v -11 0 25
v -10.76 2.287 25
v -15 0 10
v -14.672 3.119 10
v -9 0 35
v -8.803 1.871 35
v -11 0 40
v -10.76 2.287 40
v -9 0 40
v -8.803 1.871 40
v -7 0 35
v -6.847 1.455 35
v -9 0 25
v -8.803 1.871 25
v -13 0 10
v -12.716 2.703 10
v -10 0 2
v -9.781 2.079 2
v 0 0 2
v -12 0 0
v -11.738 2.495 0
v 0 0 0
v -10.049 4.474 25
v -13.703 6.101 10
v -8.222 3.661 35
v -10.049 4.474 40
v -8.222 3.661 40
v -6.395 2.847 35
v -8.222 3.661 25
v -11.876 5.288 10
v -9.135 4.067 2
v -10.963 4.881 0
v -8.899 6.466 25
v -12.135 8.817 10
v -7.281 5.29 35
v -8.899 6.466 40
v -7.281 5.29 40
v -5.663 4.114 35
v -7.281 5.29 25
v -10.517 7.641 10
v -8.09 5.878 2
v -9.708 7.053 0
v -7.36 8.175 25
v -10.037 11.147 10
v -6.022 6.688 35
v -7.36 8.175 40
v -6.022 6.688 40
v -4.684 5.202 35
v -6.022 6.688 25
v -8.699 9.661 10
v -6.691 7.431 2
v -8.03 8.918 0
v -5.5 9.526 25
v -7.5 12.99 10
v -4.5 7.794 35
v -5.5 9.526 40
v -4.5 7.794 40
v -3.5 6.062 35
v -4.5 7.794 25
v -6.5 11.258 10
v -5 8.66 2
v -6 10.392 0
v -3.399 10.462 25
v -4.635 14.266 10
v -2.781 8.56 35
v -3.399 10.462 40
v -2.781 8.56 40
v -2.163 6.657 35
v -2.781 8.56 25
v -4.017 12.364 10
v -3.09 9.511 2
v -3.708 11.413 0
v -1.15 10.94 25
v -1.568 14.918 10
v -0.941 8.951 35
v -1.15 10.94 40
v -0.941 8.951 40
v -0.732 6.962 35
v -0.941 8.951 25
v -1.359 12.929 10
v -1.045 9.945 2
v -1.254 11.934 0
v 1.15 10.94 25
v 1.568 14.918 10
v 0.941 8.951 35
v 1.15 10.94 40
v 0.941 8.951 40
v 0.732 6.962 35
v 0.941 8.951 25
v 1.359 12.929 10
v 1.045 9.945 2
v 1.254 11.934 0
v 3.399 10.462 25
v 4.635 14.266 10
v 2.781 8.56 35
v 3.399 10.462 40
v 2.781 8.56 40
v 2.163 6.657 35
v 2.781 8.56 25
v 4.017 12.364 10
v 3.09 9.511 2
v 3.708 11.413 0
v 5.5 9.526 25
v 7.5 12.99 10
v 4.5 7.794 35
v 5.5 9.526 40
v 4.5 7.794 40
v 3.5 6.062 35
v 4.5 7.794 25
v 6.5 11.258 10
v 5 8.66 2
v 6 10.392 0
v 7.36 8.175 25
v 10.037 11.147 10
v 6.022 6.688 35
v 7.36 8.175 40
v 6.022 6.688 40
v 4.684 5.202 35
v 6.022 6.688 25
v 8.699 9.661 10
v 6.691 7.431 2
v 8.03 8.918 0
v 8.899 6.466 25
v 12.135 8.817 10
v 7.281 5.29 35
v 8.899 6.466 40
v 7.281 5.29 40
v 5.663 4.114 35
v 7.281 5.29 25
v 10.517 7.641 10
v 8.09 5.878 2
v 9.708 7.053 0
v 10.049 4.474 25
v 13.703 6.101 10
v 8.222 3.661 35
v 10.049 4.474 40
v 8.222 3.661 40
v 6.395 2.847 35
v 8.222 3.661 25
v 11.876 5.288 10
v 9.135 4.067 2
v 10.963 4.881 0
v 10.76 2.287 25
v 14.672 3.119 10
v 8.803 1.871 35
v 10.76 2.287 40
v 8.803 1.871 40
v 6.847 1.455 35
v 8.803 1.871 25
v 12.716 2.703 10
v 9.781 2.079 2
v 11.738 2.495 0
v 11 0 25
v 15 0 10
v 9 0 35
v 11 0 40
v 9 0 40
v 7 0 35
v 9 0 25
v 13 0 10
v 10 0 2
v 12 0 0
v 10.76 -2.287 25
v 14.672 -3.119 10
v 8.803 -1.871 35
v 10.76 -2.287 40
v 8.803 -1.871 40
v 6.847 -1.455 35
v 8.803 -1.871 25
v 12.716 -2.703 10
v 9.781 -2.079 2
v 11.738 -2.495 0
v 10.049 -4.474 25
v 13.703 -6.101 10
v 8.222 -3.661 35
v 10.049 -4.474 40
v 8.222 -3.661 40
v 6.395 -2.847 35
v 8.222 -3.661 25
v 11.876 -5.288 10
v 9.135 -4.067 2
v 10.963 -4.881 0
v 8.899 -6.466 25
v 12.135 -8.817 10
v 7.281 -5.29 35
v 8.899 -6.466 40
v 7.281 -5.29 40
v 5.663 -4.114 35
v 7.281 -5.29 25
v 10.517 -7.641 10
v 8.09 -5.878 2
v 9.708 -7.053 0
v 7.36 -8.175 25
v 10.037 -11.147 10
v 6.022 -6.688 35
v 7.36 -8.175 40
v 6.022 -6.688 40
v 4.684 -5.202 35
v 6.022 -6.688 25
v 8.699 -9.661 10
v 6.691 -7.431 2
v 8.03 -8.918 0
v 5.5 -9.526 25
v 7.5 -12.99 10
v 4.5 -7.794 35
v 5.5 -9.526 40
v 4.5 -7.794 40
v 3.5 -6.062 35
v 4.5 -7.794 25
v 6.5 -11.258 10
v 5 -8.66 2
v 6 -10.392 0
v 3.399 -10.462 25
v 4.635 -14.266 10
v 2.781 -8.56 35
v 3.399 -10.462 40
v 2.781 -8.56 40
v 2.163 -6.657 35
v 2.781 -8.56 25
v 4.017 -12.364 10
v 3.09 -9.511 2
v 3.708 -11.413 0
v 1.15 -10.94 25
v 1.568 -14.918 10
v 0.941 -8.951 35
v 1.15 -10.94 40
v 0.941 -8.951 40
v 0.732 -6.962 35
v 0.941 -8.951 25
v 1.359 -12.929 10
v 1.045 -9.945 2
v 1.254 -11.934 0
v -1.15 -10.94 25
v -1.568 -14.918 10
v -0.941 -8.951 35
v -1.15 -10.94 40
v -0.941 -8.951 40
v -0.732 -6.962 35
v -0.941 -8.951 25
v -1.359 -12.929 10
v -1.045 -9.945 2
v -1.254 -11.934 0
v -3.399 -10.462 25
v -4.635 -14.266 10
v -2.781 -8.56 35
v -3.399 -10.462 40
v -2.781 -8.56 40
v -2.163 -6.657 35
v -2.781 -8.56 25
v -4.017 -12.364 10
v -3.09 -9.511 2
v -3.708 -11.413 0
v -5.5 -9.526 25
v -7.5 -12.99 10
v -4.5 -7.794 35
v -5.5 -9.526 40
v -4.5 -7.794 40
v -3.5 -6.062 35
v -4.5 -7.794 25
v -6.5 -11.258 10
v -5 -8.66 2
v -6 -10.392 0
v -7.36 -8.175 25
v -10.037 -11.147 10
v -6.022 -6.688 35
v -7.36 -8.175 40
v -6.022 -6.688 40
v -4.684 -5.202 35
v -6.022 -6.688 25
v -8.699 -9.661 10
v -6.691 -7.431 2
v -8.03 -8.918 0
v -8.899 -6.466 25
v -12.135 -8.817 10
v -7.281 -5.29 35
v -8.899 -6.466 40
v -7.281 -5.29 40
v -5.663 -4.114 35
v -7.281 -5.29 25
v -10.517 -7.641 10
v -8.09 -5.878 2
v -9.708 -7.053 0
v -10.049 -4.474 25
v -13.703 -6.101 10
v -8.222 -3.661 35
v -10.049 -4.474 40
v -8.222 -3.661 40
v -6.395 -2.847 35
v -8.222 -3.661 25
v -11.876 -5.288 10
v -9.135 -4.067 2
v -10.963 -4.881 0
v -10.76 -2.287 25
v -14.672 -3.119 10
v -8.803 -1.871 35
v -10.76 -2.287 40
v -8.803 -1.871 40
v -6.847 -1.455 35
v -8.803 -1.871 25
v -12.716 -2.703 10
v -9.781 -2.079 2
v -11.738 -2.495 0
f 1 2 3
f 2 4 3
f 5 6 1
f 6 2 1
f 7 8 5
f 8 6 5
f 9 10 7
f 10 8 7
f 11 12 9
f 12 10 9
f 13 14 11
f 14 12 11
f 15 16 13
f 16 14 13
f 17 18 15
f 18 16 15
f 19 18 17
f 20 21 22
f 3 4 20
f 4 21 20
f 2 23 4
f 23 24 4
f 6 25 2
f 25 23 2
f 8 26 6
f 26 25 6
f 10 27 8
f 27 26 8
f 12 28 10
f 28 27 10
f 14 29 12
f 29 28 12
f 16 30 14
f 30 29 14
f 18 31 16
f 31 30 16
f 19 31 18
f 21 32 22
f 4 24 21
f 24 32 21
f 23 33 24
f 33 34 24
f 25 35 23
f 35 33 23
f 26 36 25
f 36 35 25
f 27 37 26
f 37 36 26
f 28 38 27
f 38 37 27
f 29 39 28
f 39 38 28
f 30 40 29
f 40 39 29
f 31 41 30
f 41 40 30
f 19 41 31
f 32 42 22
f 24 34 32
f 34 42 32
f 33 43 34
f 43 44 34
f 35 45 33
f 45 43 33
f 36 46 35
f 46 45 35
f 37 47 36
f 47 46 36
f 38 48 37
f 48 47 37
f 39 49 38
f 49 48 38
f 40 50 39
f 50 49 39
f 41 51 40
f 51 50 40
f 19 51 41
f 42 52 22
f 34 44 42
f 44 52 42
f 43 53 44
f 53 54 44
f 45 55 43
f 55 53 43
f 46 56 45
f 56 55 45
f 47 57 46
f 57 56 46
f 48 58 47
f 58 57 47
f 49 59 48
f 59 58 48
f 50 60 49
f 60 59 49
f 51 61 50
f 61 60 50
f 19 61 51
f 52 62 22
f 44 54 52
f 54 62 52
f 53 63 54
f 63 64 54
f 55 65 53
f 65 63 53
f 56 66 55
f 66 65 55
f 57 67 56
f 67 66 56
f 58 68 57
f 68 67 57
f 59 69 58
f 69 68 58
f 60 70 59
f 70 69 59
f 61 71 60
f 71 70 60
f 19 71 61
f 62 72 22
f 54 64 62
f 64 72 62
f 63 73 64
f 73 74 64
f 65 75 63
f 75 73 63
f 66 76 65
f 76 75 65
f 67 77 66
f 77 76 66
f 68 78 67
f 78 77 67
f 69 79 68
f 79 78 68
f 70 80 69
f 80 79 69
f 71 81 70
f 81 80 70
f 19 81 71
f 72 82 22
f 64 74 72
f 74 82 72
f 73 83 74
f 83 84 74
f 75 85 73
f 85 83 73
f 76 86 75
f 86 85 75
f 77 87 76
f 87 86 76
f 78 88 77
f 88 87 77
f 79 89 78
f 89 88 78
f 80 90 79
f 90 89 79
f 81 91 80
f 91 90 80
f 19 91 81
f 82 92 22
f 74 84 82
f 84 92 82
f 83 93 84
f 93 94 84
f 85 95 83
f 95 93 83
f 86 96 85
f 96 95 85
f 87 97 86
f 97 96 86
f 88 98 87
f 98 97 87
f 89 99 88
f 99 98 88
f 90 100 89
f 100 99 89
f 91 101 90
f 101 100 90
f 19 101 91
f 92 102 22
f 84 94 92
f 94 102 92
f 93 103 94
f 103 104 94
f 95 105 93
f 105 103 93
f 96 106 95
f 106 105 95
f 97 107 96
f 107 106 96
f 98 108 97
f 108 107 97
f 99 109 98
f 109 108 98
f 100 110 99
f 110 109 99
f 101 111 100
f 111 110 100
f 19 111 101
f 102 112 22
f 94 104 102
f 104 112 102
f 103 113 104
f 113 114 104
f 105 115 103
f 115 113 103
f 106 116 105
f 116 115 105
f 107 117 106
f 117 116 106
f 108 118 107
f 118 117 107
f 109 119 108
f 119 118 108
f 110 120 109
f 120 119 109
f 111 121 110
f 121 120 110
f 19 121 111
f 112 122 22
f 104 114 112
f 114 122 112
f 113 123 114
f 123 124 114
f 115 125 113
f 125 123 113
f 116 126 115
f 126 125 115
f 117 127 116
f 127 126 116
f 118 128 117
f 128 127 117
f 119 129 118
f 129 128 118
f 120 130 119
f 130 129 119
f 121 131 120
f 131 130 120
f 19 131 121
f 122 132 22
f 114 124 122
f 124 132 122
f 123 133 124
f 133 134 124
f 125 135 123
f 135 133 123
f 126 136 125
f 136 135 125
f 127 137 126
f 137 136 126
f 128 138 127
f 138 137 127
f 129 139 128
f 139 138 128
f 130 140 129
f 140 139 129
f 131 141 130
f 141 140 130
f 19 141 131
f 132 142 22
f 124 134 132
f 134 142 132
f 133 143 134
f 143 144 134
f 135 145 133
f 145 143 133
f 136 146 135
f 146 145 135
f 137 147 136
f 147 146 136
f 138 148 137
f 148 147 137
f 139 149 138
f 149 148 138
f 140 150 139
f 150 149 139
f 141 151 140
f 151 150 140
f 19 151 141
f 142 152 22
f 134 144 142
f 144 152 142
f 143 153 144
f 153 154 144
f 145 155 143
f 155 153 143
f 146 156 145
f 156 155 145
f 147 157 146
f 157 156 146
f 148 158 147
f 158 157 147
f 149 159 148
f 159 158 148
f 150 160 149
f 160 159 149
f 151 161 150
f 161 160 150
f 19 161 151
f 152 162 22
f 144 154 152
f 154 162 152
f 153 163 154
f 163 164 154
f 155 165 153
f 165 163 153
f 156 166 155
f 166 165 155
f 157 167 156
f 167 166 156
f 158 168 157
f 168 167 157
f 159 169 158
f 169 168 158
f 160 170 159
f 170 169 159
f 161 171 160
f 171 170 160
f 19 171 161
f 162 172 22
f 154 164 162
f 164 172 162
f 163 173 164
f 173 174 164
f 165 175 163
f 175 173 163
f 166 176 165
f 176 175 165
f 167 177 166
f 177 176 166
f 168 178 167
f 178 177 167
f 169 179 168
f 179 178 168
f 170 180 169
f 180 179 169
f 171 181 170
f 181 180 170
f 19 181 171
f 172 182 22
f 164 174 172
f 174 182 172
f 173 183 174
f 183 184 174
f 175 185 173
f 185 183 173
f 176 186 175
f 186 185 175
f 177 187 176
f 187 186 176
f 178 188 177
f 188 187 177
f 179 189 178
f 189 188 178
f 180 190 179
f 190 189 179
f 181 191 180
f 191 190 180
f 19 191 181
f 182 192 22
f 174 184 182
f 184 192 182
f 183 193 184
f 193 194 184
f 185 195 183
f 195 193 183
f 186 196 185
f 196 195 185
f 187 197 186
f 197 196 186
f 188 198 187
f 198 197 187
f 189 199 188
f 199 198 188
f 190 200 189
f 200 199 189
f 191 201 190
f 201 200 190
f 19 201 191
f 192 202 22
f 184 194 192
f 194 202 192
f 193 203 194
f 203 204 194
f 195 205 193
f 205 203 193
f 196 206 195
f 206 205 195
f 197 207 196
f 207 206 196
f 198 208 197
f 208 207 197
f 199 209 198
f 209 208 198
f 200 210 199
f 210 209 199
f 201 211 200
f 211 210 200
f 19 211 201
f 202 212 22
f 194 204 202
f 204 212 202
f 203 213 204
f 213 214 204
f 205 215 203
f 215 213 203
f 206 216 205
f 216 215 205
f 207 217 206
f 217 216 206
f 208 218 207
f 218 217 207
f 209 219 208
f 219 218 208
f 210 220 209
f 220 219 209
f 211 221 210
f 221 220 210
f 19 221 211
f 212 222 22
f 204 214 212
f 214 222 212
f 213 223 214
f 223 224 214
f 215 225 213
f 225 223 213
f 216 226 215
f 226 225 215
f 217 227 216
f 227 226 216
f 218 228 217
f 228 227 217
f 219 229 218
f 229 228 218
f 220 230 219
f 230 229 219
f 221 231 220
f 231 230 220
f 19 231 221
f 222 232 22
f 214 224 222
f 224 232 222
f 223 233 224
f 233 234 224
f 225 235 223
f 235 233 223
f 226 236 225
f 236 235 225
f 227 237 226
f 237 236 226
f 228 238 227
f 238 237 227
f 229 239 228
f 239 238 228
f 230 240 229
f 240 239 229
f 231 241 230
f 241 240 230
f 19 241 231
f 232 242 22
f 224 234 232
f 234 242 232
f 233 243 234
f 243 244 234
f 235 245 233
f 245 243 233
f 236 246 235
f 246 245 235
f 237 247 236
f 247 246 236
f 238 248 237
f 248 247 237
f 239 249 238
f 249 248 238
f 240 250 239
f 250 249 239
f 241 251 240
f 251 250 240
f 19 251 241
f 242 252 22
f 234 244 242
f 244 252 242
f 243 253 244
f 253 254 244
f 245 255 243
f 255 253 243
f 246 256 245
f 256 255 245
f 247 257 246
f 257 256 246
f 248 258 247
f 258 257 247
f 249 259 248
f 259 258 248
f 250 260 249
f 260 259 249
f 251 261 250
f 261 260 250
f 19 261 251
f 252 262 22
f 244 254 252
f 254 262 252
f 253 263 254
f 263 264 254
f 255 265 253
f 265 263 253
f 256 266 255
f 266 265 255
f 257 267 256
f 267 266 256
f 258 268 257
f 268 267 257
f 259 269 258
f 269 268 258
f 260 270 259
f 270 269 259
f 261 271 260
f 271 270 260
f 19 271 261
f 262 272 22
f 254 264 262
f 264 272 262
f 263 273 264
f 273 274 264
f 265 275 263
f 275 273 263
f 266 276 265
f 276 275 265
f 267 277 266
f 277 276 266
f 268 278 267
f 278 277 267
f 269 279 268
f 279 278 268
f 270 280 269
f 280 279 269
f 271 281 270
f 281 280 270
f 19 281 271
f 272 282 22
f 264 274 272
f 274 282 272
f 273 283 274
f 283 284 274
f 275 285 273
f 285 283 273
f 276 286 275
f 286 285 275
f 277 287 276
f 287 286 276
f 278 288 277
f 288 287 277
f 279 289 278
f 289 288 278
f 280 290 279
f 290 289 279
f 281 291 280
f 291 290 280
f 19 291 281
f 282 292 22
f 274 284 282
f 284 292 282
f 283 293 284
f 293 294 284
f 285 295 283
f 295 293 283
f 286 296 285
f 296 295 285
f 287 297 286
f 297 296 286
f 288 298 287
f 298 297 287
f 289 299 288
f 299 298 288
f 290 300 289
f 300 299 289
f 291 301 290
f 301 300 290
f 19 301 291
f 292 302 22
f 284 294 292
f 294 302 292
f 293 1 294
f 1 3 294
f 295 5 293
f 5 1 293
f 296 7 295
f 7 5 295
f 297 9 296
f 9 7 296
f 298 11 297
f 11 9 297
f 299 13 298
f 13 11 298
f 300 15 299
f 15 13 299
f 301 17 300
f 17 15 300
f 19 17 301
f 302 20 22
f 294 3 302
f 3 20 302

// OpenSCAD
// Purpose: vase as rotate_extrude of a polygon profile (wall 2 mm, bottom 2 mm).
h = 40;
wall = 2;
outer = [[12, 0], [15, 10], [11, 25], [9, 35], [11, h]];
// Inner contour: outer contour moved inwards by the wall thickness, from top to bottom.
inner = [for (i = [len(outer) - 1 : -1 : 1]) [outer[i][0] - wall, max(outer[i][1], wall)]];
profile = concat([[0, 0]], outer, inner, [[outer[0][0] - wall, wall], [0, wall]]);
echo(points = len(profile), top = profile[len(outer)]);
rotate_extrude() polygon(profile);
